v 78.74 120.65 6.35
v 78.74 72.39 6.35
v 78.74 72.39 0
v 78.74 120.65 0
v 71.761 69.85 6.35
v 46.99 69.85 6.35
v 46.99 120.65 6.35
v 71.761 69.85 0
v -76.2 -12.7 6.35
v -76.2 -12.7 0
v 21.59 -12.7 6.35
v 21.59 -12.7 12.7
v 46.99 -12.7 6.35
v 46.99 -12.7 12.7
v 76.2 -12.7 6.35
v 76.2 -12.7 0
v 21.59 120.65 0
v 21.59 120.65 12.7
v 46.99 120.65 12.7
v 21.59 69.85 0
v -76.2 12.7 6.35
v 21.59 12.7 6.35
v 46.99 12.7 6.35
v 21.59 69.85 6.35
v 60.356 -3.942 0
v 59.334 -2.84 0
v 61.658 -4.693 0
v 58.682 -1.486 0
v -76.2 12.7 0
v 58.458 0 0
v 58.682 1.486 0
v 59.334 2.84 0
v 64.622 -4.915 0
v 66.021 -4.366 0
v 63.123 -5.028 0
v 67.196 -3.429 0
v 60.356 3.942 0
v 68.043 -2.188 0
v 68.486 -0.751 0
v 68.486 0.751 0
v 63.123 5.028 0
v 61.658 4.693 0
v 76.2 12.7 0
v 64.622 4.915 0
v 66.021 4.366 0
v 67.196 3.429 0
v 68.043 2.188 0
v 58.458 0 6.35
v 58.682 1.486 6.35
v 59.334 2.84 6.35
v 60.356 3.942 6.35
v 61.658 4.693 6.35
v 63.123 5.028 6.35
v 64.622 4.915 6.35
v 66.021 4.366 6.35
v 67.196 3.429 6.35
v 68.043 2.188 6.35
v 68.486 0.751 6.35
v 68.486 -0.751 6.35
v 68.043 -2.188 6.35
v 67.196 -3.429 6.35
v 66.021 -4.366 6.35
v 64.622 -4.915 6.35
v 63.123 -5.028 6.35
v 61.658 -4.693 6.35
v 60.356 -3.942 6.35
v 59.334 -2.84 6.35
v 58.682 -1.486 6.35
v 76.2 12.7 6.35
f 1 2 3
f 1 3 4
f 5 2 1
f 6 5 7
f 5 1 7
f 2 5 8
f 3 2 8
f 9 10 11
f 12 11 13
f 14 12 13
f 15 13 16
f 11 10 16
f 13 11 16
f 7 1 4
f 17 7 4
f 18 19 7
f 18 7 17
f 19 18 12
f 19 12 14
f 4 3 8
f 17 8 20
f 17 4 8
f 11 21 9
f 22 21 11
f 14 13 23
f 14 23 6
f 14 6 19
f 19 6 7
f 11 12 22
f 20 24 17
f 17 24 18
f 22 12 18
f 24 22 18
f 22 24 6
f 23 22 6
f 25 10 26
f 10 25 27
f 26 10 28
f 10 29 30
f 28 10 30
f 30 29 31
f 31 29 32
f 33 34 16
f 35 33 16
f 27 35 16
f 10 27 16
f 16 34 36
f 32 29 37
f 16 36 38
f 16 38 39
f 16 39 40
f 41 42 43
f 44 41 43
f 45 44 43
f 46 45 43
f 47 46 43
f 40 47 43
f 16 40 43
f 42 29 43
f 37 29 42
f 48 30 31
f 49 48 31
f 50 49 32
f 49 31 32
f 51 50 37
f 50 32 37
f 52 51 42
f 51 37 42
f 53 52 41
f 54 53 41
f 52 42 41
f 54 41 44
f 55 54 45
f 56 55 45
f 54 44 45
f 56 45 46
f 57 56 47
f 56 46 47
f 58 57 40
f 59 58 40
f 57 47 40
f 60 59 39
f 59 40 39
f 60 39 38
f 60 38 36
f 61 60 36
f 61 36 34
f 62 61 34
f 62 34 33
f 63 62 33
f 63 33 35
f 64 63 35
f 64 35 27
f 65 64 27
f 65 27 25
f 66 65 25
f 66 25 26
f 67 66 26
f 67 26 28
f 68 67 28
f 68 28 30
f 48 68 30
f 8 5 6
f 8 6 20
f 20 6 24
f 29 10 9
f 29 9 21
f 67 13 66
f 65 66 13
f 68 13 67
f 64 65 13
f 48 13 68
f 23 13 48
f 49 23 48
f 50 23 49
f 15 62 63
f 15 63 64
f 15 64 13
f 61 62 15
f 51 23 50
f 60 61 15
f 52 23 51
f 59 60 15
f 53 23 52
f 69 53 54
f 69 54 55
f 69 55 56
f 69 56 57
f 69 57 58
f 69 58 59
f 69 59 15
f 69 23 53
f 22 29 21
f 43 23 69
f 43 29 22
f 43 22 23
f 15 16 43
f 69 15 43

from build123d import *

# Parameters (mm, degrees)
SKETCH1_W                   = 152.4
SKETCH1_H                   = 25.4
EXTRUDE1_DEPTH              = 6.35
SKETCH2_W                   = 25.4
SKETCH2_H                   = 133.35
EXTRUDE2_DEPTH              = 6.35
SKETCH3_W                   = 57.15
SKETCH3_H                   = 50.8
EXTRUDE3_DEPTH              = 6.35
CHAMFER1_SIZE               = 2.54
CHAMFER1_SIZE2              = 6.978592645
F_3_8_CLEARANCE_HOLE1_D     = 10.0838
F_3_8_CLEARANCE_HOLE1_DEPTH = 38.1
F_3_8_CLEARANCE_HOLE1_TIP   = 3.029479155


with BuildPart() as part:
    # Sketch1 → Extrude1 (new body)
    with BuildSketch(Plane.XY):
        Rectangle(SKETCH1_W, SKETCH1_H)
    extrude(amount=EXTRUDE1_DEPTH)

    # Sketch2 → Extrude2 (add)
    with BuildSketch(Plane.XY.offset(6.35)):
        with Locations((34.29, 53.975)):
            Rectangle(SKETCH2_W, SKETCH2_H)
    extrude(amount=EXTRUDE2_DEPTH)

    # Sketch3 → Extrude3 (add)
    with BuildSketch(Plane(origin=(0, 0, 6.35), x_dir=(-1, 0, 0), z_dir=(0, 0, -1))):
        with Locations((-50.165, 95.25)):
            Rectangle(SKETCH3_W, SKETCH3_H)
    extrude(amount=EXTRUDE3_DEPTH)

    # Chamfer1
    chamfer1_edges = [part.edges().sort_by_distance(p)[0] for p in [
        (78.74, 69.85, 3.175),
    ]]
    chamfer1_side = [part.faces().sort_by_distance(p)[0] for p in [
        (78.74, 95.25, 3.175),
    ]]
    chamfer(chamfer1_edges, length=CHAMFER1_SIZE, length2=CHAMFER1_SIZE2, reference=chamfer1_side[0])

    # 3/8 Clearance Hole1
    with Locations(Plane(origin=(63.5, 0, 6.35), x_dir=(1, 0, 0), z_dir=(0, 0, 1))):
        with Locations((0, 0)):
            Hole(F_3_8_CLEARANCE_HOLE1_D / 2, depth=F_3_8_CLEARANCE_HOLE1_DEPTH)
            with Locations((0, 0, -(F_3_8_CLEARANCE_HOLE1_DEPTH + F_3_8_CLEARANCE_HOLE1_TIP / 2))):  # 118° drill point
                Cone(0, F_3_8_CLEARANCE_HOLE1_D / 2, F_3_8_CLEARANCE_HOLE1_TIP, mode=Mode.SUBTRACT)


solid = part.part
